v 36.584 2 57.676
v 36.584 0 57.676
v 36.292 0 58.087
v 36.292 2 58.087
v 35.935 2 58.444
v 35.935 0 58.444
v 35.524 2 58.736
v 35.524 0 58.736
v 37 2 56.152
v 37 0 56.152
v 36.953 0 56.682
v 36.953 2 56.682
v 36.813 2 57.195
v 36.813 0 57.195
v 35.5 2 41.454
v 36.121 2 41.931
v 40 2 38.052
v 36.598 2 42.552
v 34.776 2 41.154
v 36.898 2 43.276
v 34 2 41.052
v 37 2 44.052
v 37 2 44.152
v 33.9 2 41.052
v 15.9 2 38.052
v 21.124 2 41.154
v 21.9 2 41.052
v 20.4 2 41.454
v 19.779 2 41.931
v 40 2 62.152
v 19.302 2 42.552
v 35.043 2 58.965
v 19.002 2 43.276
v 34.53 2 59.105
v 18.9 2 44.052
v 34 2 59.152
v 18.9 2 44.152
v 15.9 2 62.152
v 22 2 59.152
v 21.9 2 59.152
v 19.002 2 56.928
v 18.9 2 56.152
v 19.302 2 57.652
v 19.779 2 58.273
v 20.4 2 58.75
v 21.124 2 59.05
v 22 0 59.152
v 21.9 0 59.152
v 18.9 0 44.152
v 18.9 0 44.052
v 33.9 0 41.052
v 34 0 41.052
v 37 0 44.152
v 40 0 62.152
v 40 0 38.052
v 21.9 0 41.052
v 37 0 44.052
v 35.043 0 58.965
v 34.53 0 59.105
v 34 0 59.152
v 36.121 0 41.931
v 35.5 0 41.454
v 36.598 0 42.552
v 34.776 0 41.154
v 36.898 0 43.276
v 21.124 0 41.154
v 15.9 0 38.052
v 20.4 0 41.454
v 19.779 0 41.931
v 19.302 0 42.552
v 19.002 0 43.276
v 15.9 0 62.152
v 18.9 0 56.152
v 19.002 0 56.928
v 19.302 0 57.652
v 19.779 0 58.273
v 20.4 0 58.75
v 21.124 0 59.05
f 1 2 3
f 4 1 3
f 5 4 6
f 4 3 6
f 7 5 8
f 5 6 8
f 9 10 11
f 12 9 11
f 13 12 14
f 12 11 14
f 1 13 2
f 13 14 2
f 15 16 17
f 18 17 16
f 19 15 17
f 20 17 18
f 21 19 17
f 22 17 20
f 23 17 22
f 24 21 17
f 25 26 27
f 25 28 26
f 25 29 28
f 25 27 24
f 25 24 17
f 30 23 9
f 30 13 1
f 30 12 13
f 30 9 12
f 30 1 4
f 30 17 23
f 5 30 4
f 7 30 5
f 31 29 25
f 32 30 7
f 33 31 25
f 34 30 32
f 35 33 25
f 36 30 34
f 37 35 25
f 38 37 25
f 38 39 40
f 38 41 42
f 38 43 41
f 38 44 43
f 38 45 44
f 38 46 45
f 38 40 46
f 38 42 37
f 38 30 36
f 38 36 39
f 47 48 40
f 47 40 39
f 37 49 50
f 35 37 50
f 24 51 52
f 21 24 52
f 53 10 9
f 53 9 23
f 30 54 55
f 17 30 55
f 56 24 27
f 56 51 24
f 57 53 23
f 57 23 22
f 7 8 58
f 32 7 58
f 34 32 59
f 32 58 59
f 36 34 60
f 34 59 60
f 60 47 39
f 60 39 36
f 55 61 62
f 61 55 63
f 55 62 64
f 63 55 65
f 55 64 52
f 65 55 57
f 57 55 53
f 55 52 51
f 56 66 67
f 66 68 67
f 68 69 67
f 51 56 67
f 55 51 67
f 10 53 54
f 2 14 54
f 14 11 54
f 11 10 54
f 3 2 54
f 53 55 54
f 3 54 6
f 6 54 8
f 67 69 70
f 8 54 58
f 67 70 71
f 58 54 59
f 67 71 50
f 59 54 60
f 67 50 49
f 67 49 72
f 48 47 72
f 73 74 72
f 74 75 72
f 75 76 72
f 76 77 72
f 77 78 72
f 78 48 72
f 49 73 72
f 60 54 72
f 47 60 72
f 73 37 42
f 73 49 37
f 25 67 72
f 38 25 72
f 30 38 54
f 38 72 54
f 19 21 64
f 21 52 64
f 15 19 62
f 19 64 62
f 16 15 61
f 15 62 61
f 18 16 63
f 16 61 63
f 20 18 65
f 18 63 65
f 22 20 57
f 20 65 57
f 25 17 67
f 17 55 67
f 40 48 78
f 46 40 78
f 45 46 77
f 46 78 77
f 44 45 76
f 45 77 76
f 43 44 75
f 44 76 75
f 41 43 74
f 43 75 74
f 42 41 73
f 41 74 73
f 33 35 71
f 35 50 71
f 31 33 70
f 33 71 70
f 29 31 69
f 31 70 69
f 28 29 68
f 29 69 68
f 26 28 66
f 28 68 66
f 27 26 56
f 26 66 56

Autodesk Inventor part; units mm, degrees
ref_plane "YZ Plane" through (0, 0, 0) normal (1, 0, 0) x (0, 1, 0)
ref_plane "XZ Plane" through (0, 0, 0) normal (0, 1, 0) x (-1, 0, 0)
ref_plane "XY Plane" through (0, 0, 0) normal (0, 0, 1) x (1, 0, 0)
sketch "Sketch2" plane through (0, 0, 0) normal (0, 1, 0) x (-1, 0, 0)
  line L0 (-22, 59.152) -> (-34, 59.152)
  arc A0 (-34, 59.152) -> (-35.5236, 58.7363) centre (-34, 56.152) ccw
  arc A1 (-35.5236, 58.7363) -> (-36.5843, 57.6756) centre (-34, 56.152) ccw
  arc A2 (-36.5843, 57.6756) -> (-37, 56.152) centre (-34, 56.152) ccw
  line L1 (-37, 56.152) -> (-37, 44.152)
  arc A3 (-37, 44.052) -> (-34, 41.052) centre (-34, 44.052) ccw
  line L2 (-33.9, 41.052) -> (-21.9, 41.052)
  arc A4 (-21.9, 41.052) -> (-18.9, 44.052) centre (-21.9, 44.052) ccw
  line L3 (-18.9, 44.152) -> (-18.9, 56.152)
  arc A5 (-18.9, 56.152) -> (-21.9, 59.152) centre (-21.9, 56.152) ccw
  line L4 (-15.9, 62.152) -> (-40, 62.152)
  line L5 (-40, 62.152) -> (-40, 38.052)
  line L6 (-40, 38.052) -> (-15.9, 38.052)
  line L7 (-15.9, 38.052) -> (-15.9, 62.152)
  line L8 (-21.9, 59.152) -> (-22, 59.152)
  line L9 (-37, 44.152) -> (-37, 44.052)
  line L10 (-33.9, 41.052) -> (-34, 41.052)
  line L11 (-18.9, 44.152) -> (-18.9, 44.052)
  point P0 (0, 0)
  dimension "d6" = 18.1
  dimension "d7" = 18.1
  dimension "d14" = 3
  dimension "d24" = 3
  dimension "d25" = 3
  dimension "d28" = 3
  dimension "d29" = 3
extrude "Extrusion1" add sketch "Sketch2" along normal blind 2
equation "\"BendRadius\" = Thickness"
equation "\"BendReliefWidth\" = Thickness"
equation "\"BendReliefDepth\" = 0.5 * Thickness"
equation "\"CornerReliefSize\" = 4 * Thickness"
equation "\"MinimumRemnant\" = 2 * Thickness"
equation "\"TransitionRadius\" = BendRadius"
equation "\"JacobiRadiusSize\" = BendRadius"
equation "\"GapSize\" = Thickness"
equation "\"Thickness\" = 0.5"
properties part number "mould"
